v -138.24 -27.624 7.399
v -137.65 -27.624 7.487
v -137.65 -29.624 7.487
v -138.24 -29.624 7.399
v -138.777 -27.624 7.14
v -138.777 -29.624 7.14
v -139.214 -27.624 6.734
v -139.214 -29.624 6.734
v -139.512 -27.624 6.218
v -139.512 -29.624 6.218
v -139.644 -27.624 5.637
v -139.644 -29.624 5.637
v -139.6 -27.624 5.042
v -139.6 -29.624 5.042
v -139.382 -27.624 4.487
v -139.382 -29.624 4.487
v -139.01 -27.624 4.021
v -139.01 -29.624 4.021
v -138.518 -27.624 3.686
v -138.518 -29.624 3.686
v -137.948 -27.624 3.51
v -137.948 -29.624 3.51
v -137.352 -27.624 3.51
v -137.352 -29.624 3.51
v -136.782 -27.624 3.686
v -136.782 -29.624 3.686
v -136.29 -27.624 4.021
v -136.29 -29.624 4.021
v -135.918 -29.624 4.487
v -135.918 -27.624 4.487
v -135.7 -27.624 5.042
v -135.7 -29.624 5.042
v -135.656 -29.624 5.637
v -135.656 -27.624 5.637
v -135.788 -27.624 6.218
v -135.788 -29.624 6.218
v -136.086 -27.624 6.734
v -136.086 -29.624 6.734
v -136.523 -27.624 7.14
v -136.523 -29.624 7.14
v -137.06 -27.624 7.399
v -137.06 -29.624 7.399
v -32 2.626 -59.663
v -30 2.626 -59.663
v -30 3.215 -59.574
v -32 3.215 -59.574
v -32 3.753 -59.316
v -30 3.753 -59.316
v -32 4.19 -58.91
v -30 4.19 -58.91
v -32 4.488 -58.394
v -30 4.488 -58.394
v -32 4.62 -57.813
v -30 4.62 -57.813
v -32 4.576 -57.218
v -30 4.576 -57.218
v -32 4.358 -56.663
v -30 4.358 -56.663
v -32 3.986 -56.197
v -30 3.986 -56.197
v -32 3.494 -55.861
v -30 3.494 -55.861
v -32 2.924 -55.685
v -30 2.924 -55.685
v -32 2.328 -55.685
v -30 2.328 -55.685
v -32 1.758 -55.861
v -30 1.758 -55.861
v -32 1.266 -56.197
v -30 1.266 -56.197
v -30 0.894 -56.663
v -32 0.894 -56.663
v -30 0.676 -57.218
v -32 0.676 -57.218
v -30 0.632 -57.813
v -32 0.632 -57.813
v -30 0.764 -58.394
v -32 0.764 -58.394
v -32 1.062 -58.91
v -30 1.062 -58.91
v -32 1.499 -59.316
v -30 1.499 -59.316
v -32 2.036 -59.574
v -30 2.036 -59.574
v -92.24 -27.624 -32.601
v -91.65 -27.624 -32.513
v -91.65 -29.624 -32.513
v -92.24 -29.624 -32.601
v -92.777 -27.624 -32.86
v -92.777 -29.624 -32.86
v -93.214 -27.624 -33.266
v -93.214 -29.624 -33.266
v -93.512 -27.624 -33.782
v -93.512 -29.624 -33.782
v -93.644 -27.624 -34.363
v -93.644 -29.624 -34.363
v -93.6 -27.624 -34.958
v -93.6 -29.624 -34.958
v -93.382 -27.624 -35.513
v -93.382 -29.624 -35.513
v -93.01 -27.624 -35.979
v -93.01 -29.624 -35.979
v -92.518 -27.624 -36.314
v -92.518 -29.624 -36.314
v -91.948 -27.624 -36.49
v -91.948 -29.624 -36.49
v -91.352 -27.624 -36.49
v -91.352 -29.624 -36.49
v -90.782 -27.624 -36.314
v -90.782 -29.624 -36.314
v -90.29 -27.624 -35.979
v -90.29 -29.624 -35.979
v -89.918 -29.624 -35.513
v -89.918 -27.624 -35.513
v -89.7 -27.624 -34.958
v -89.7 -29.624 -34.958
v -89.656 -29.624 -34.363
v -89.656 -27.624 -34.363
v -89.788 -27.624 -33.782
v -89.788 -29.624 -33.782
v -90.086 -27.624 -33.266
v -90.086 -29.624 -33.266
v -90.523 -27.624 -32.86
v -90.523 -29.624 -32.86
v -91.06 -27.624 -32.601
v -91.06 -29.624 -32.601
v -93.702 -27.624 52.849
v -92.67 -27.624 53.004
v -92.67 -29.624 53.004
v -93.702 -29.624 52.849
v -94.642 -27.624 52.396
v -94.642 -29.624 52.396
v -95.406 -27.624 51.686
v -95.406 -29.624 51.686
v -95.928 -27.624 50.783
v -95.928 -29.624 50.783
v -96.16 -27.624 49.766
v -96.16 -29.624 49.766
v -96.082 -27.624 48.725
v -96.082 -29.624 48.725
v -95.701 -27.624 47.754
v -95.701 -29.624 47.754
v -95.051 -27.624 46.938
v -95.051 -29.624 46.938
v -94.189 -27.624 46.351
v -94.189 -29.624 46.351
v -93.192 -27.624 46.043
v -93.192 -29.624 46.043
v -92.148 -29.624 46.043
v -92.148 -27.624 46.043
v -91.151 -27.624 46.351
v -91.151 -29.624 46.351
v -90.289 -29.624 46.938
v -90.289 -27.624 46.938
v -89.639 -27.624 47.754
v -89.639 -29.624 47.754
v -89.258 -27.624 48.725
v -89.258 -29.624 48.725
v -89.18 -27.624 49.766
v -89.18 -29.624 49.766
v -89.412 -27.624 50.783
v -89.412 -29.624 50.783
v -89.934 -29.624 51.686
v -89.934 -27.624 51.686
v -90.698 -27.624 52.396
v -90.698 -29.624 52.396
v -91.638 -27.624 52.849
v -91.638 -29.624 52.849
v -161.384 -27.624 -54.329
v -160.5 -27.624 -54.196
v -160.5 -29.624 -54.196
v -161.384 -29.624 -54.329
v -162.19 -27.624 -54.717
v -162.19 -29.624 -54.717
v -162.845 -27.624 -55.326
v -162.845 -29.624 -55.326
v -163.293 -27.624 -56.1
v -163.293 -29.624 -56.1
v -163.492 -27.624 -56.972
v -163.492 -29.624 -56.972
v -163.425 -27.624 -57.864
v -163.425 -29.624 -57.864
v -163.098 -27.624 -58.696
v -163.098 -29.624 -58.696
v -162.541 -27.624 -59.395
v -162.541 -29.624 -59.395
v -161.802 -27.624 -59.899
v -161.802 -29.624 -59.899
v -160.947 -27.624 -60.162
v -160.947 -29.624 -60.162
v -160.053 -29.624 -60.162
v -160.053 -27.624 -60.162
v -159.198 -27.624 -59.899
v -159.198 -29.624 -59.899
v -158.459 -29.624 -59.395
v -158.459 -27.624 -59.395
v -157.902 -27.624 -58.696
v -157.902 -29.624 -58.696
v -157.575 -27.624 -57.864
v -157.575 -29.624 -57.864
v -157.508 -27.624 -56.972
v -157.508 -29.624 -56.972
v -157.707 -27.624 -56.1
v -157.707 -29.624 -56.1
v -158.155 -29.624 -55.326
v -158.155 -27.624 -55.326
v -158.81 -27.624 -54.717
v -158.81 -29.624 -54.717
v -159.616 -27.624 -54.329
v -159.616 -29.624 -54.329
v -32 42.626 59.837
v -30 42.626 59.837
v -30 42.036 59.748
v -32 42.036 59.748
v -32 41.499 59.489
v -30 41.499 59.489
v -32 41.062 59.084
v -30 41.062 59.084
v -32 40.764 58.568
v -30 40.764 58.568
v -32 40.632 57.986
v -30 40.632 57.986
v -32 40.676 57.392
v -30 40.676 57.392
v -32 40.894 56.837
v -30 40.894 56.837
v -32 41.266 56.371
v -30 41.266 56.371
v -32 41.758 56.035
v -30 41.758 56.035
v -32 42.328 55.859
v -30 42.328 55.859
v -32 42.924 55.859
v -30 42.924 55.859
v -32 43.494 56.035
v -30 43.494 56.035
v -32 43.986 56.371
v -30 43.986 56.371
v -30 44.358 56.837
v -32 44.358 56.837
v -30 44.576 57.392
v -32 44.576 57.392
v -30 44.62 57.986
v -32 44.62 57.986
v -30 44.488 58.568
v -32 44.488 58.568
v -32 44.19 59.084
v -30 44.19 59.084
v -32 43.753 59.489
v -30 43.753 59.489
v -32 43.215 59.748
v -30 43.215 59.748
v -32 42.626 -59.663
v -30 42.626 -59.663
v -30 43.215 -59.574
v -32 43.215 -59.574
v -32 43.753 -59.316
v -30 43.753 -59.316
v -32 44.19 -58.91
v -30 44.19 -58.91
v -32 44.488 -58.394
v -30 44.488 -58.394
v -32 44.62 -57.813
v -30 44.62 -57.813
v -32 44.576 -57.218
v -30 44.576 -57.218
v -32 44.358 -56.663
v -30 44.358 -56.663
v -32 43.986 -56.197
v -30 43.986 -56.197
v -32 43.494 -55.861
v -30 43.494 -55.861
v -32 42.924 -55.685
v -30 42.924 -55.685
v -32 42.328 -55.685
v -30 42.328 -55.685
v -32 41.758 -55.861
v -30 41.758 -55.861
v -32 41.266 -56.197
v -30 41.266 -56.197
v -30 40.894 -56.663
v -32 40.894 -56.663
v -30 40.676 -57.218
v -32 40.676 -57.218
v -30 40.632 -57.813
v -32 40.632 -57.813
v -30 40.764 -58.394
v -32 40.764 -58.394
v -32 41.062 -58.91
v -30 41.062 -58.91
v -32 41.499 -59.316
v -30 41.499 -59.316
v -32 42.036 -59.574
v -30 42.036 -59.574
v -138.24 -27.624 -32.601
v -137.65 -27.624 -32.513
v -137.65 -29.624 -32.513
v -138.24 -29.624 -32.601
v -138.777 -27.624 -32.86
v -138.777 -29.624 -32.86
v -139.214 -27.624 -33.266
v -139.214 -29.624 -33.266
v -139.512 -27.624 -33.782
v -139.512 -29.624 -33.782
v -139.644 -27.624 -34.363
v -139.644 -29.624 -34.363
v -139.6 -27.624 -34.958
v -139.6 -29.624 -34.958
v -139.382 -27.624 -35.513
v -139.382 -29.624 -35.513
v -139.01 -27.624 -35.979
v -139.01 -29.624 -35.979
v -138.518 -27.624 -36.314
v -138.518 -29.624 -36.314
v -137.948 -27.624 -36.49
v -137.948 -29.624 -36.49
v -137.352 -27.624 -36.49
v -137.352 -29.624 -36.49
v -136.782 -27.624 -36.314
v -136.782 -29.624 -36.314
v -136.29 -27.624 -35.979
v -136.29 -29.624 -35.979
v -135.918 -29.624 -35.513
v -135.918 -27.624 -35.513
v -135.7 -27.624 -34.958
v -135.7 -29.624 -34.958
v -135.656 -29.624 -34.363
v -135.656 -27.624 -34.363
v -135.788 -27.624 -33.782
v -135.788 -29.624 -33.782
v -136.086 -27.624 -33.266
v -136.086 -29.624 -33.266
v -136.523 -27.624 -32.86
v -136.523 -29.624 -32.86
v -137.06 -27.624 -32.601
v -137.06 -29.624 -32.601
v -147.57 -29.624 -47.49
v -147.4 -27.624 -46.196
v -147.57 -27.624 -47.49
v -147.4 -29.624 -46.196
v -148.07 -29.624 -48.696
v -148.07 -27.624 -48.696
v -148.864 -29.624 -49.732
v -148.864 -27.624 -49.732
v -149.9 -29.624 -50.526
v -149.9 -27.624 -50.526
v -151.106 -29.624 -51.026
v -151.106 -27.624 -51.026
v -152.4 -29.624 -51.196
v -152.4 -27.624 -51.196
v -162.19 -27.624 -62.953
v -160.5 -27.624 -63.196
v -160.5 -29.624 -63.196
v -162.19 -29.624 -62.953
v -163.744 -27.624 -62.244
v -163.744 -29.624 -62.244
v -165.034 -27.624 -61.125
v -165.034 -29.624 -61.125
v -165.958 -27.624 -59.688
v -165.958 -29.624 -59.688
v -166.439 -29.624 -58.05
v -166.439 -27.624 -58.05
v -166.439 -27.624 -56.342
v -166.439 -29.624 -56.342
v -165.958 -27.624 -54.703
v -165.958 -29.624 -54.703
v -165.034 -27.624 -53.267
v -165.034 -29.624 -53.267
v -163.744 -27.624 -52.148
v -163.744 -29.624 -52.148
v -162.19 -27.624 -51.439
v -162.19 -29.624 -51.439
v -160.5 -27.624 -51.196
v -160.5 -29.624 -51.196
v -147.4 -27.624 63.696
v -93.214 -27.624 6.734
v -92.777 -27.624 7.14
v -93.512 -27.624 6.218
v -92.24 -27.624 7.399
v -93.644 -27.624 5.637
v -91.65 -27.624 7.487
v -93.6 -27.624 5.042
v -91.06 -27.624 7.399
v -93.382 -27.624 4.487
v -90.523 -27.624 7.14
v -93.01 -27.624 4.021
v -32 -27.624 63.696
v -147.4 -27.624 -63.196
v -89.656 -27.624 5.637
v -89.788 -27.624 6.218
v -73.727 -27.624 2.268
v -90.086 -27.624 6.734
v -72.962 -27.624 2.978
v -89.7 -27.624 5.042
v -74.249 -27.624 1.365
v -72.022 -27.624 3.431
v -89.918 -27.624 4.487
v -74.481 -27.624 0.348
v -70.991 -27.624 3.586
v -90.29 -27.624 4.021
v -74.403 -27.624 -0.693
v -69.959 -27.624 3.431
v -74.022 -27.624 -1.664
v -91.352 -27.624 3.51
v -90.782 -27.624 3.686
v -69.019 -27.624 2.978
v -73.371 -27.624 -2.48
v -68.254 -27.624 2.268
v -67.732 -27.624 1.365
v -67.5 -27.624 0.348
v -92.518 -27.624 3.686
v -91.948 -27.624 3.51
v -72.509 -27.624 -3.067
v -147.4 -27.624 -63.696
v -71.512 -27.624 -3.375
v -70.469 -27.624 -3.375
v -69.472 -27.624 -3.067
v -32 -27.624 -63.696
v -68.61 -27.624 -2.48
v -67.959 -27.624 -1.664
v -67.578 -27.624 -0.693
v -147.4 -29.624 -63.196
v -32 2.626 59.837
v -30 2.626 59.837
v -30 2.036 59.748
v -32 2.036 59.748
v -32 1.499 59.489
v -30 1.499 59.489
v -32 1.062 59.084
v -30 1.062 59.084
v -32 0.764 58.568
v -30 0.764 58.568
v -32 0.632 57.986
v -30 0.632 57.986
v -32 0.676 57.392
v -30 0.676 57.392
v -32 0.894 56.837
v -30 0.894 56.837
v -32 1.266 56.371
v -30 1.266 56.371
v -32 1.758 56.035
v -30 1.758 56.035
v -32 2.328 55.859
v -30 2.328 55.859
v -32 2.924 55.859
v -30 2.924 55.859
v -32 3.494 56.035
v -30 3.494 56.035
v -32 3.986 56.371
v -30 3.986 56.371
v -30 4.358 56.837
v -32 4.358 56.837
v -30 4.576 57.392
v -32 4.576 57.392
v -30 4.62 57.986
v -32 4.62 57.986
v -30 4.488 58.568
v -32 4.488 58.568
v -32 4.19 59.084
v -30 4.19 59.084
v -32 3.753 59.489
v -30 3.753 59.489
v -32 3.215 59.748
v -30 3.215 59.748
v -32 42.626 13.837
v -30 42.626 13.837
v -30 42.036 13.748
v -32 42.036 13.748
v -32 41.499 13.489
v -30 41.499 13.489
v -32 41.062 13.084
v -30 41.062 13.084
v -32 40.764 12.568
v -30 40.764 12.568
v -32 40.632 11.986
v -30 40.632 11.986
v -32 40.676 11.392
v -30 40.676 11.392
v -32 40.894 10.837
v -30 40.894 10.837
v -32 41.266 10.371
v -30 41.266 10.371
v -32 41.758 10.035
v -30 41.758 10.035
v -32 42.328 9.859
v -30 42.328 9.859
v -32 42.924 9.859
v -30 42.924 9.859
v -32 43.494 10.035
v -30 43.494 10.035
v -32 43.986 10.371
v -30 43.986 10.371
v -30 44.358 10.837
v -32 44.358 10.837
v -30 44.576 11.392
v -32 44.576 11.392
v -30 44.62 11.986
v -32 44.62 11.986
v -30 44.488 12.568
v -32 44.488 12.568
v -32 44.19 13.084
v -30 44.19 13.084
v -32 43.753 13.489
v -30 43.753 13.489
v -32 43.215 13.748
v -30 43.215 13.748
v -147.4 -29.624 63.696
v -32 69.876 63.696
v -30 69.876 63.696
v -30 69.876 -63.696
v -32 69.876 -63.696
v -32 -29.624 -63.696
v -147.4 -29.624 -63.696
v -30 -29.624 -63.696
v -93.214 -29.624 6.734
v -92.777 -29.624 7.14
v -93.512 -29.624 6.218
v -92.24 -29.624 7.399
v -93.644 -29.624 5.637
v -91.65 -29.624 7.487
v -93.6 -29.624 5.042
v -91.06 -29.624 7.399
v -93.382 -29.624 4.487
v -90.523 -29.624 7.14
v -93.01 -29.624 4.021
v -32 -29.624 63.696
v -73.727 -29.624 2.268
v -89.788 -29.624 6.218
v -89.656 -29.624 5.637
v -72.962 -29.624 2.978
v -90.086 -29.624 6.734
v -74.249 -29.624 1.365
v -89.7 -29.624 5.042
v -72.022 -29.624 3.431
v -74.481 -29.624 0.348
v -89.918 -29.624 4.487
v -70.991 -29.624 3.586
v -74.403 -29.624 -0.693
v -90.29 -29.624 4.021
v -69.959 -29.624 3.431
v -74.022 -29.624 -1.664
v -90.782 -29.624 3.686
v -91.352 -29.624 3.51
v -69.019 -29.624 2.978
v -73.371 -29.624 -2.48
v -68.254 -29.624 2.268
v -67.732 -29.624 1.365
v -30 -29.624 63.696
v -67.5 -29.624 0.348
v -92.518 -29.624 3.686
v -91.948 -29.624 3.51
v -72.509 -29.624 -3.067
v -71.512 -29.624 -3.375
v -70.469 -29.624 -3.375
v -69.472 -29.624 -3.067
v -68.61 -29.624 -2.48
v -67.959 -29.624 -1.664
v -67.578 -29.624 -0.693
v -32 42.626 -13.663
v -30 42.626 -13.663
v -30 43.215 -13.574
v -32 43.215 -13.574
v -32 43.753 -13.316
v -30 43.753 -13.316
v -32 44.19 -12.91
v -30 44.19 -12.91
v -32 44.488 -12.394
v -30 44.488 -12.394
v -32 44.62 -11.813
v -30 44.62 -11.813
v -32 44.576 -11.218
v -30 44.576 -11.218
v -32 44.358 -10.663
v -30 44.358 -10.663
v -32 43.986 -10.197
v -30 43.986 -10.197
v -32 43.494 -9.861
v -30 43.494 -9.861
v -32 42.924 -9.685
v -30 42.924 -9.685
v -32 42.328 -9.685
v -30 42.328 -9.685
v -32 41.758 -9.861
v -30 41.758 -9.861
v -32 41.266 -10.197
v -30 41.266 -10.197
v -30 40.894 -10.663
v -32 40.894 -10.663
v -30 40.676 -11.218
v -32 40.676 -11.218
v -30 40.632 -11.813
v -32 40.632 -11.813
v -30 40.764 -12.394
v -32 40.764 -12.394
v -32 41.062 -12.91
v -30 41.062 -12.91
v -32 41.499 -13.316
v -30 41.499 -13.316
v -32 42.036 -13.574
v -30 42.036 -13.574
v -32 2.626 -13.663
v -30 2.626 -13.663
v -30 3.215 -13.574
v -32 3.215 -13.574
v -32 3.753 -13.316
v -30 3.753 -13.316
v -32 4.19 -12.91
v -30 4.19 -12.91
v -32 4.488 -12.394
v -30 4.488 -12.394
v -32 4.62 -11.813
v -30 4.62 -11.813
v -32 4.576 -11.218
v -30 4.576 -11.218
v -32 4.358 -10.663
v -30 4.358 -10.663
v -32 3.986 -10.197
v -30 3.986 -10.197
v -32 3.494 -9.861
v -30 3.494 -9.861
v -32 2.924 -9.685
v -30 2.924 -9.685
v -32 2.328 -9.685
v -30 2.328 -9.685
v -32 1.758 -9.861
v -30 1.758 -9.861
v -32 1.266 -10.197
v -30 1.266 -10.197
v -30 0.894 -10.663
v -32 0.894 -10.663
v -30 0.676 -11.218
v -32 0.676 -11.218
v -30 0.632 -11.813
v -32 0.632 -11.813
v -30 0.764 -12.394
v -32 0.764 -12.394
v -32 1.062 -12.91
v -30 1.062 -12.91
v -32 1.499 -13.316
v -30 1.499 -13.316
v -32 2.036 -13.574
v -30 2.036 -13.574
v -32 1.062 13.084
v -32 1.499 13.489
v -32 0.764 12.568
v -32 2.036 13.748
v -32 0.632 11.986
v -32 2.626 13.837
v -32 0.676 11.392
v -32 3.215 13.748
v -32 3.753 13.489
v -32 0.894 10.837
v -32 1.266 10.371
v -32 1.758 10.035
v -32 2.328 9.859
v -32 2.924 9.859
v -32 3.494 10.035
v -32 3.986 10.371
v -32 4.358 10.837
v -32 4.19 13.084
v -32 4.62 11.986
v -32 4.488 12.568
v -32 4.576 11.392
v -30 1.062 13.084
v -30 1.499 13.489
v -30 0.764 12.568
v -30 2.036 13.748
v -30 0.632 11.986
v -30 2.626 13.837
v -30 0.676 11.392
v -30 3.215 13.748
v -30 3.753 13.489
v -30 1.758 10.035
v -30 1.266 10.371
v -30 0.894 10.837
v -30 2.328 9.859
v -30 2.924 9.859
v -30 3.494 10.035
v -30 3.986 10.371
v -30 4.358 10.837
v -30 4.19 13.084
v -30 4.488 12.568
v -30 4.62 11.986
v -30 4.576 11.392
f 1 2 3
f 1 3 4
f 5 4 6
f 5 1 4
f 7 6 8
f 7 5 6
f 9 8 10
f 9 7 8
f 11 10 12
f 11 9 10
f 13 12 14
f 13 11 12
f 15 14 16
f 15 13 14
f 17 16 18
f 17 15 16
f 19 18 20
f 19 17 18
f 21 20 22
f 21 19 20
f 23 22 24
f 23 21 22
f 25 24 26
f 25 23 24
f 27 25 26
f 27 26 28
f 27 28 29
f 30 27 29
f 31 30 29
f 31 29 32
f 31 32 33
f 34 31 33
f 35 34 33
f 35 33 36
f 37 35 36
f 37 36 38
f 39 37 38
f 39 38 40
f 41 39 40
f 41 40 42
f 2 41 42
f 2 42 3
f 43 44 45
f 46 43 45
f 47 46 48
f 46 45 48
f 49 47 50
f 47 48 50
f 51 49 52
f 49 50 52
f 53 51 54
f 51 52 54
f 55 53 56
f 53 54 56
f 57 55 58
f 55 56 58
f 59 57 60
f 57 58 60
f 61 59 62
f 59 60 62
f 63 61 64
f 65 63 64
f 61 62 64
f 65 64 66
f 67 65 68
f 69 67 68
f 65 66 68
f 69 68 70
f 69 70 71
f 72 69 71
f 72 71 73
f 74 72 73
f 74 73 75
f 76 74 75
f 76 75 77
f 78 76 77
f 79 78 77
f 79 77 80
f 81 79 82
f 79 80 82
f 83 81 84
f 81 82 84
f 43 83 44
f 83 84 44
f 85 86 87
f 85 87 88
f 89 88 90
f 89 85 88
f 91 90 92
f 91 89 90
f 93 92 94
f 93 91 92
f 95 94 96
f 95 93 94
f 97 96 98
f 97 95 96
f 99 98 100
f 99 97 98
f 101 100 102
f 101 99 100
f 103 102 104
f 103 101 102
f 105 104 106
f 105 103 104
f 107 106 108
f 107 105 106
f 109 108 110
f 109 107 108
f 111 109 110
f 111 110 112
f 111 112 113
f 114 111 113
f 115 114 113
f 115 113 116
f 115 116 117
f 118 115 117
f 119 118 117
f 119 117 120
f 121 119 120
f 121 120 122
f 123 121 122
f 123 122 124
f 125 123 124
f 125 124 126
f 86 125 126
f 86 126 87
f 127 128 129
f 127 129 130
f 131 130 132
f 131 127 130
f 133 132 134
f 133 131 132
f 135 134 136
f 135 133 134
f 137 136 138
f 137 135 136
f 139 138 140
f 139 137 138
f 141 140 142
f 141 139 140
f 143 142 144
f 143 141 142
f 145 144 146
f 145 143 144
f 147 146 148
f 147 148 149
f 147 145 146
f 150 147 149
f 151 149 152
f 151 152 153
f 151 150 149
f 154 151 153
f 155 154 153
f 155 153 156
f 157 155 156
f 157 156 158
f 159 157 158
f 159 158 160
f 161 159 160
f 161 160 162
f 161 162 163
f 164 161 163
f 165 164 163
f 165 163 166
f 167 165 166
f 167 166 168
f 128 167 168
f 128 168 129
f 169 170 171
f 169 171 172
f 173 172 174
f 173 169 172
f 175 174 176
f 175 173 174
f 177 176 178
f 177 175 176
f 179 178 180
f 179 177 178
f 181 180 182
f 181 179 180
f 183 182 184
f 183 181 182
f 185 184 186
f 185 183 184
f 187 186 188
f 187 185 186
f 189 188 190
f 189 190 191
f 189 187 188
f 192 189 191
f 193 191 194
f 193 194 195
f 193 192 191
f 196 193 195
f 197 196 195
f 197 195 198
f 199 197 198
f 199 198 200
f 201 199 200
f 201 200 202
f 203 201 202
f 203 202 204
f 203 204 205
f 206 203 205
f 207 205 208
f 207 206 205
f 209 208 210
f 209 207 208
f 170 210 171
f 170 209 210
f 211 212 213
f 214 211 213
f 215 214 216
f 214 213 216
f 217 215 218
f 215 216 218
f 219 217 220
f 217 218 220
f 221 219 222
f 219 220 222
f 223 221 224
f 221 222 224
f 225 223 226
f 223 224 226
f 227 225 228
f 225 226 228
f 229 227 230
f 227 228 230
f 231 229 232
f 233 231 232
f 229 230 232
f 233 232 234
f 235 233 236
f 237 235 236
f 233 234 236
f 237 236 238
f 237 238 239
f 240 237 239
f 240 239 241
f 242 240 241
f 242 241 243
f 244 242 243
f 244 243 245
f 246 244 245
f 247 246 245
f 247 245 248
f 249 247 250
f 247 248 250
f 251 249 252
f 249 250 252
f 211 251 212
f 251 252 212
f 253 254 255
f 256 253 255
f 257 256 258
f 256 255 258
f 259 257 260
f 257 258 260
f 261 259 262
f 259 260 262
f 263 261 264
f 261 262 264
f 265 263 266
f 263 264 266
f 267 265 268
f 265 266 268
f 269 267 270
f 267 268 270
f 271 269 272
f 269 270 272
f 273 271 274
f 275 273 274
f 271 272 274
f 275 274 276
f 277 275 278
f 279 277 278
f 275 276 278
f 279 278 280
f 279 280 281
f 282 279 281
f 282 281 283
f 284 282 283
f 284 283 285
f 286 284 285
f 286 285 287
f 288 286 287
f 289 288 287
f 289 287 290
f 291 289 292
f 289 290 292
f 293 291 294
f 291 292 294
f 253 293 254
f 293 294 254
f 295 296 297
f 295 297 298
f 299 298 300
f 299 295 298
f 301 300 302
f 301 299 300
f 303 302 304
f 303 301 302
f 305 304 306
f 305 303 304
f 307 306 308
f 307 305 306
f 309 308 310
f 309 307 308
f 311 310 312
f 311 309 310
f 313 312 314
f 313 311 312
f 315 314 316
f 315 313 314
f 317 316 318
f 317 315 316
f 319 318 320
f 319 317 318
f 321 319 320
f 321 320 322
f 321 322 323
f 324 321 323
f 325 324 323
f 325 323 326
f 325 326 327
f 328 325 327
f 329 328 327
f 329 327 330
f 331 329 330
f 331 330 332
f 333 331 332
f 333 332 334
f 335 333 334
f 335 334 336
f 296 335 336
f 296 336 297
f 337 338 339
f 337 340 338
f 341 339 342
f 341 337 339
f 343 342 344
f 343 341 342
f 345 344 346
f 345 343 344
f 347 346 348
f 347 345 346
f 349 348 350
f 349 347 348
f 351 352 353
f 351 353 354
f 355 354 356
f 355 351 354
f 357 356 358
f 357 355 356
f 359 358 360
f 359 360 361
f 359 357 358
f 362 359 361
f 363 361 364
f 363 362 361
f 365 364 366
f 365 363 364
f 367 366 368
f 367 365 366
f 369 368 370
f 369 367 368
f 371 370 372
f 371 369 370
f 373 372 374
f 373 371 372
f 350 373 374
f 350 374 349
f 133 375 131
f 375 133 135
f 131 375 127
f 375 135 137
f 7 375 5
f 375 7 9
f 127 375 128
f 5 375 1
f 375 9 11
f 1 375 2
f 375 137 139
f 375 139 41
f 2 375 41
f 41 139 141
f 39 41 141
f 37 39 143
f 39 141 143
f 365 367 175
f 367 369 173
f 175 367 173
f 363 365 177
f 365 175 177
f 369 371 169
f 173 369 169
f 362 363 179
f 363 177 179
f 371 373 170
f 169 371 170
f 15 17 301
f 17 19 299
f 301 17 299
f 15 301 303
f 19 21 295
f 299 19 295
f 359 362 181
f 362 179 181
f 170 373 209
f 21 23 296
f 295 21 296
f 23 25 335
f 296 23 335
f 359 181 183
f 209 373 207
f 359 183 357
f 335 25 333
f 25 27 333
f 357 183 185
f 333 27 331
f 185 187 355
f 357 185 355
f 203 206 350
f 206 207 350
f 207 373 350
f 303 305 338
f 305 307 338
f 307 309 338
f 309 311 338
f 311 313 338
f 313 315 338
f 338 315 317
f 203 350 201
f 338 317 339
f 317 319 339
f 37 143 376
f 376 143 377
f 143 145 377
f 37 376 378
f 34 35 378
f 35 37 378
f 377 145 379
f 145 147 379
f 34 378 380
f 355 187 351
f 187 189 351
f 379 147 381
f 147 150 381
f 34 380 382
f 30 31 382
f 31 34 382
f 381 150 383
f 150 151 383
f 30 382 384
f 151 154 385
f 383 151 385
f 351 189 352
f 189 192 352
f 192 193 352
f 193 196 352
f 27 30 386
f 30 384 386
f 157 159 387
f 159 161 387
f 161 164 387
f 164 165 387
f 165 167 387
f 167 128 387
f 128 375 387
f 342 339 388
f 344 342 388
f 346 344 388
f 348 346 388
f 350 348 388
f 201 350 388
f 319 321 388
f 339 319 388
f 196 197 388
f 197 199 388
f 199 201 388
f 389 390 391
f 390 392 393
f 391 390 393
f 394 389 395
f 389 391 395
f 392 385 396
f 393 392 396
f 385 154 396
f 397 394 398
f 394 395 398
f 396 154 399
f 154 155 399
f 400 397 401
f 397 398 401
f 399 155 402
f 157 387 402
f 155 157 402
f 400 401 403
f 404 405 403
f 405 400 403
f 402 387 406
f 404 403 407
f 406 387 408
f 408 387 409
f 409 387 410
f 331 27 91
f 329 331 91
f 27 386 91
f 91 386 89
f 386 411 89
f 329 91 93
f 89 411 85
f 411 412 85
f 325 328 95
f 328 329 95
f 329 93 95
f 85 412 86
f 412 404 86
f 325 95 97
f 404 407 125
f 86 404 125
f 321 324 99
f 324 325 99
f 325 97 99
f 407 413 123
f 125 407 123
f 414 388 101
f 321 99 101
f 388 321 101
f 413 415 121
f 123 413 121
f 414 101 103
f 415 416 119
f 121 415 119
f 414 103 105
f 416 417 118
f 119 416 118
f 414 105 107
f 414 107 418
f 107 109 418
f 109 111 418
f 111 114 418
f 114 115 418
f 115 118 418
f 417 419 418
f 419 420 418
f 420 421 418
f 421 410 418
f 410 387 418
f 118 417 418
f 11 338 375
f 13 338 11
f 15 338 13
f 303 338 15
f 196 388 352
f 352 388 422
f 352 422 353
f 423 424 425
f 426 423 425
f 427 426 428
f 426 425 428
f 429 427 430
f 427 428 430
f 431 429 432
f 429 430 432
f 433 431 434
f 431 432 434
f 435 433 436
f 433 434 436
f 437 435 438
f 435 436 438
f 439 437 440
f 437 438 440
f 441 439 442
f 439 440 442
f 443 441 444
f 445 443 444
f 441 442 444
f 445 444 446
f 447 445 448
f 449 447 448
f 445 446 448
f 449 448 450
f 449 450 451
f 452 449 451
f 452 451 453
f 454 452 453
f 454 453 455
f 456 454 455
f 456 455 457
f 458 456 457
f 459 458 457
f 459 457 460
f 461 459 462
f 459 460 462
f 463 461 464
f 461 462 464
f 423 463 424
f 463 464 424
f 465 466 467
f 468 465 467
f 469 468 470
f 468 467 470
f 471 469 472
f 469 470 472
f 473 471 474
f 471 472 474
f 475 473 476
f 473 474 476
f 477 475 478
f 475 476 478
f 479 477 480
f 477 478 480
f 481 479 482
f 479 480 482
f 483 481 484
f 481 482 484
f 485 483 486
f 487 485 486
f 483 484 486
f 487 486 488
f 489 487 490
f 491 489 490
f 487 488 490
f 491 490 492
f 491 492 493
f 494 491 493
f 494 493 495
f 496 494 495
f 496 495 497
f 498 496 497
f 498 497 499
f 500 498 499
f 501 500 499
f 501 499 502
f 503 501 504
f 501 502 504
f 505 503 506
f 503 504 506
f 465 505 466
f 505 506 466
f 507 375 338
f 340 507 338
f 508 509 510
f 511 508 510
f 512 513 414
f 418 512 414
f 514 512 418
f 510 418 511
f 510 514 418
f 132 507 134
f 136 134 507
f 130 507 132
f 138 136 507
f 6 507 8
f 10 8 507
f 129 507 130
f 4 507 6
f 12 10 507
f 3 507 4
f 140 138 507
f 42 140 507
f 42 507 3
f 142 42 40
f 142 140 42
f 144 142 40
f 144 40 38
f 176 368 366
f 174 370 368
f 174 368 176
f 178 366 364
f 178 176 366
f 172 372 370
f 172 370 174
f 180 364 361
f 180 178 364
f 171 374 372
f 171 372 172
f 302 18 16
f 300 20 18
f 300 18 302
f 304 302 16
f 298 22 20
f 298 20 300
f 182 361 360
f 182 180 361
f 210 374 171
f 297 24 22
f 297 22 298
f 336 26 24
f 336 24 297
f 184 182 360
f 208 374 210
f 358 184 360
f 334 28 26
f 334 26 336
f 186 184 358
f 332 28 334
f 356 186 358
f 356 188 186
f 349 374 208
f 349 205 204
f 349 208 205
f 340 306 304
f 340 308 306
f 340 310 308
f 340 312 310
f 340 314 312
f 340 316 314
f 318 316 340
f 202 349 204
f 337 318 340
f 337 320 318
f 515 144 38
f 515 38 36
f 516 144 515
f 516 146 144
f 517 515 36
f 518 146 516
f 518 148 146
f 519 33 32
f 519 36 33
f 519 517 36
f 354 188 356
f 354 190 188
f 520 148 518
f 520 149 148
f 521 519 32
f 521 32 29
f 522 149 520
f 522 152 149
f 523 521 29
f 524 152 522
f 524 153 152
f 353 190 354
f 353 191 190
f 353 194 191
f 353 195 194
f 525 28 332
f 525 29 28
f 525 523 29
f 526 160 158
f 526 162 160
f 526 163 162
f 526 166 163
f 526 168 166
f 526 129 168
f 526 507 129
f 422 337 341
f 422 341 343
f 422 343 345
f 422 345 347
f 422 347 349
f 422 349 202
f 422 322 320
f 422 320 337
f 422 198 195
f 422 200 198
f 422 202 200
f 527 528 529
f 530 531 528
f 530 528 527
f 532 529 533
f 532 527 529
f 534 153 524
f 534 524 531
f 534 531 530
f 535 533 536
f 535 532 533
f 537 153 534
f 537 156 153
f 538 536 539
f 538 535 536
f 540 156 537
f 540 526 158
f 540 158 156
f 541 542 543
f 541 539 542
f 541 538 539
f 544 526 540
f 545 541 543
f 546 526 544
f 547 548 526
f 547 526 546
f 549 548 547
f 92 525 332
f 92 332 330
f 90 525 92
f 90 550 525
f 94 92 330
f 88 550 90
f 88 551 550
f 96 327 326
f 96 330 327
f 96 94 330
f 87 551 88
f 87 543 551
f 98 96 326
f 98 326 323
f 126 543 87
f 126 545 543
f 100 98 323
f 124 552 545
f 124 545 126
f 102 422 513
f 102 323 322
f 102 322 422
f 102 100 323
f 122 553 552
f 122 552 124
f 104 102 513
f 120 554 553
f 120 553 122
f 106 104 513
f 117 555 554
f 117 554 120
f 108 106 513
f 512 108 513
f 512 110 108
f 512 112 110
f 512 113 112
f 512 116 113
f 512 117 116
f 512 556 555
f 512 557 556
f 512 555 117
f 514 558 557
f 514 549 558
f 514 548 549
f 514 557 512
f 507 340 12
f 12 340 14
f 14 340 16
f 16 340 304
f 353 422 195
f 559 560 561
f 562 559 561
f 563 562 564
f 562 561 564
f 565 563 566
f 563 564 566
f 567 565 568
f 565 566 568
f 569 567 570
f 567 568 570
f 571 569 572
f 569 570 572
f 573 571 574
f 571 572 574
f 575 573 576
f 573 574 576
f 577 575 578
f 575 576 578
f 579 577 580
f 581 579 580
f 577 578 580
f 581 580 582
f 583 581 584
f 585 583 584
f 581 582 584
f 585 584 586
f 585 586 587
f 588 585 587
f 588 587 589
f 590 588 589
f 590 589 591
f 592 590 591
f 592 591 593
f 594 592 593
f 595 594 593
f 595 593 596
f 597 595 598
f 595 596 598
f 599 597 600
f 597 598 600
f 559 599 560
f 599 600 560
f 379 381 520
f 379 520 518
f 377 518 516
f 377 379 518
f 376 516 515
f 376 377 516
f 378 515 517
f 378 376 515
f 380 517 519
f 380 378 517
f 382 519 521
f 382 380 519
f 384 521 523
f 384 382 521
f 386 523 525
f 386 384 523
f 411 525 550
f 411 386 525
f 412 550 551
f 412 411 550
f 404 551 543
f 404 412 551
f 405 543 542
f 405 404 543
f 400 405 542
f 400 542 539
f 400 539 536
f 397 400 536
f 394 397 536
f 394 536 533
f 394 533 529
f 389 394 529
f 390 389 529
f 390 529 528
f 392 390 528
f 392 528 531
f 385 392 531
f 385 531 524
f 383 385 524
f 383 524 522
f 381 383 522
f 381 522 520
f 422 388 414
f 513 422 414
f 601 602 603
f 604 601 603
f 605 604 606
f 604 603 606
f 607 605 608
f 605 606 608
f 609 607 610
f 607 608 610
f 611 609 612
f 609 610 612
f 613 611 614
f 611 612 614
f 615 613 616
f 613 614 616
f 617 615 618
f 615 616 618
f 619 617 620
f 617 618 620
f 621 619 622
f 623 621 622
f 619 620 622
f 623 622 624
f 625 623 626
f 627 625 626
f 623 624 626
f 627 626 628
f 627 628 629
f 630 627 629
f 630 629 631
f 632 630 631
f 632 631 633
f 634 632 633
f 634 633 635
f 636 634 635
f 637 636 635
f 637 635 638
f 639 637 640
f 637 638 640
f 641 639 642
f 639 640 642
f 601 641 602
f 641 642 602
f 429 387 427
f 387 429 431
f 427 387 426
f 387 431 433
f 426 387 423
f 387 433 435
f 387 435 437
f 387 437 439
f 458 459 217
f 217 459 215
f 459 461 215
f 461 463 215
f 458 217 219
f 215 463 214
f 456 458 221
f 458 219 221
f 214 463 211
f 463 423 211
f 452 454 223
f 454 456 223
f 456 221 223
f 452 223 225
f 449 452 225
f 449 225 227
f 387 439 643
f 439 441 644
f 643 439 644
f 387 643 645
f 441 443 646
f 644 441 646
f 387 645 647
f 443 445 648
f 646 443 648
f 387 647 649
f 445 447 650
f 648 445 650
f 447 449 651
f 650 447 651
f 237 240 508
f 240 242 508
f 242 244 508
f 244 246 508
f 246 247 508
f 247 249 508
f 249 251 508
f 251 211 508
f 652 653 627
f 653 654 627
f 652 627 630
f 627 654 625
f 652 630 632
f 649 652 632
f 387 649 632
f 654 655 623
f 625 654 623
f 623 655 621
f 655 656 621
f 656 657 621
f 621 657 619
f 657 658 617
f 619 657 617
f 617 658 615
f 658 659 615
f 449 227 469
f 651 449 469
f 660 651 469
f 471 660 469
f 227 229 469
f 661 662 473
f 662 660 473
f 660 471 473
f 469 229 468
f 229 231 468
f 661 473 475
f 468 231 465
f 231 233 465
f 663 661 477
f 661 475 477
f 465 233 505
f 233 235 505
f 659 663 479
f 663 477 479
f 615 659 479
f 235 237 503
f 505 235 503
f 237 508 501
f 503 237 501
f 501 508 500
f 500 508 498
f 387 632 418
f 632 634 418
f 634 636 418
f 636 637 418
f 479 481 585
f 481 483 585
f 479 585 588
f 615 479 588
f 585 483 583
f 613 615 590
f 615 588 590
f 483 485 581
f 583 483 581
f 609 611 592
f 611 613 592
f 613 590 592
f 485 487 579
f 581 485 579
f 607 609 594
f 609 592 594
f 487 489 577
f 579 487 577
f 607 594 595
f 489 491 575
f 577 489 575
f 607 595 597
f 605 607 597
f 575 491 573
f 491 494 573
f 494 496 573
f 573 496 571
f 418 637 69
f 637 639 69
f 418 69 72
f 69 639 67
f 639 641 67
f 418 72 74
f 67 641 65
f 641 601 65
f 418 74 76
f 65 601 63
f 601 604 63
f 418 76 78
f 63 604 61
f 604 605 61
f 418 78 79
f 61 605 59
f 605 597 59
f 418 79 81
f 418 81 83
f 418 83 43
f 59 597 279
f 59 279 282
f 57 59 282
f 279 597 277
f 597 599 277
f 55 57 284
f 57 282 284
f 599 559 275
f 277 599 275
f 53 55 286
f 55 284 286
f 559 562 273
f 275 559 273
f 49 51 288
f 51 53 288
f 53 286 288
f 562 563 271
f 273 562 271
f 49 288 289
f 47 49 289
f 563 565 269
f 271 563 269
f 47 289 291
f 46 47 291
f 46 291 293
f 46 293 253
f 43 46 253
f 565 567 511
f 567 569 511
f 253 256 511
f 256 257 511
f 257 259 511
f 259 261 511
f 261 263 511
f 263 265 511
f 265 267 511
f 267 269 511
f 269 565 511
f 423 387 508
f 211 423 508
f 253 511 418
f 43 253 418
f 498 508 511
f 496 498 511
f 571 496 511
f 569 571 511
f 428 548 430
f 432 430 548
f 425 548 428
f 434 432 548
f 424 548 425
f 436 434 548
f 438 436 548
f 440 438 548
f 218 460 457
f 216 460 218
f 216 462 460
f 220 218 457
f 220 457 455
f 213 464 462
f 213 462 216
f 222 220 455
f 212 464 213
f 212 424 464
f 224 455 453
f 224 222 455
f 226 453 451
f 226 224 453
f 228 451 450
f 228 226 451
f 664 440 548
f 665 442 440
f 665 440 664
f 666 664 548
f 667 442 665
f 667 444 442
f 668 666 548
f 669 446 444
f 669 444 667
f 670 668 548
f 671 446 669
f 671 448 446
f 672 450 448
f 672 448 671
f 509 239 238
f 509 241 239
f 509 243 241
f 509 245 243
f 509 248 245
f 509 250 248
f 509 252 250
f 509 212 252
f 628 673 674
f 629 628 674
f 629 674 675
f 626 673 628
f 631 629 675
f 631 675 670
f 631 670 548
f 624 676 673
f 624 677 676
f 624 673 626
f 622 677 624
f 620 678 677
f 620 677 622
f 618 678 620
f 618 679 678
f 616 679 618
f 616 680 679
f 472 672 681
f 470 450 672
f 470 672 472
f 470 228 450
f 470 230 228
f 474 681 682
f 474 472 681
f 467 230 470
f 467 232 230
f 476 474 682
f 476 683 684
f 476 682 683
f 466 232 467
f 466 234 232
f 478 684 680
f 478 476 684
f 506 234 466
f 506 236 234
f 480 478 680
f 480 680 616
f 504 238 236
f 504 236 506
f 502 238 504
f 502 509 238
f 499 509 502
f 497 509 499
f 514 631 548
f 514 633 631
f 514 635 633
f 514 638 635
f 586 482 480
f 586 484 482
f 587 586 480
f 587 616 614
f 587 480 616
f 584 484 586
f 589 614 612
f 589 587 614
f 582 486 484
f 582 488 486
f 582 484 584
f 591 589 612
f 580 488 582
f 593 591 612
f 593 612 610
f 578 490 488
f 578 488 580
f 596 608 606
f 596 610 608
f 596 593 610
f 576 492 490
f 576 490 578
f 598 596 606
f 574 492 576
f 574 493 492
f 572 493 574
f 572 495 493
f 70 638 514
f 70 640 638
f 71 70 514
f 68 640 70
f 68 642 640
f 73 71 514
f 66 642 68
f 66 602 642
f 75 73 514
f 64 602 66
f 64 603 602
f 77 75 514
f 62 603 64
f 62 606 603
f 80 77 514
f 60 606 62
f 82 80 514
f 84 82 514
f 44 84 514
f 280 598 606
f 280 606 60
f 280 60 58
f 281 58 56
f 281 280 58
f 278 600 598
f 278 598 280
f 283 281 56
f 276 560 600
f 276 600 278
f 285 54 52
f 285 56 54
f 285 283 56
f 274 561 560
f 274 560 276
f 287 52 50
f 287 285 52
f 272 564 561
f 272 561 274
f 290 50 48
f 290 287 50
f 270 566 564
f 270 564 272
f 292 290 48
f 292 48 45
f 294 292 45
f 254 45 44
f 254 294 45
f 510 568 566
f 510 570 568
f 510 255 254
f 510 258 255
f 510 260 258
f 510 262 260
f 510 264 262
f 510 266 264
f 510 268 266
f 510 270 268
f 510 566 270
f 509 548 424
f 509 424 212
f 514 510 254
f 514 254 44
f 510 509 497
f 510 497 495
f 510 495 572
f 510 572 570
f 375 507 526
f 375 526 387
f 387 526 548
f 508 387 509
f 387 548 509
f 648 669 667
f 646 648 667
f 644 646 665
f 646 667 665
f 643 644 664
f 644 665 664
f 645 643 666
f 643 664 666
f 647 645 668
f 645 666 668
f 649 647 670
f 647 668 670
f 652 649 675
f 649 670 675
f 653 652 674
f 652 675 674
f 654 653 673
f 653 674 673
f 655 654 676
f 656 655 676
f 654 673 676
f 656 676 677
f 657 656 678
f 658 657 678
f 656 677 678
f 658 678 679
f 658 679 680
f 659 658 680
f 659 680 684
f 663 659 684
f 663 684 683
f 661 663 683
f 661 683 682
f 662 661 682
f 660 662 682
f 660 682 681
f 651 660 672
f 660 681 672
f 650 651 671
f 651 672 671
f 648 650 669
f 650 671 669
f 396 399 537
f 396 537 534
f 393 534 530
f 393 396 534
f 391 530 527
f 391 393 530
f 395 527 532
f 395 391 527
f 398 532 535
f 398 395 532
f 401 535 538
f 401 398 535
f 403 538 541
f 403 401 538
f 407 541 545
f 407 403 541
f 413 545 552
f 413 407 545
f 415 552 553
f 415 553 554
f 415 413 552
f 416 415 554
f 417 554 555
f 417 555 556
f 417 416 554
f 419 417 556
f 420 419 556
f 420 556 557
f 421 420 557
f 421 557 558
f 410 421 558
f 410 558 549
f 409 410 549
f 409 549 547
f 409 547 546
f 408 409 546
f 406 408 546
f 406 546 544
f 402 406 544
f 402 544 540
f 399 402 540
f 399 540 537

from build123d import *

# Parameters (mm, degrees)
SKETCH_1_W          = 127.39196645
SKETCH_1_H          = 99.499845157
SKETCH_1_R          = 2
EXTRUDE_1_DEPTH     = 2
SKETCH_2_W          = 127.39196645
SKETCH_2_H          = 2
EXTRUDE_2_DEPTH     = 115.4
SKETCH_4_R          = 2
CUT_EXTRUDE_1_DEPTH = 144.079097981
SKETCH_6_R          = 3.5
CUT_EXTRUDE_2_DEPTH = 166.366738145
SKETCH_7_R          = 3
EXTRUDE_3_DEPTH     = 2
FILLET_1_R          = 5
SKETCH_8_W          = 161.877108061
SKETCH_8_H          = 133.071465469
CUT_EXTRUDE_3_DEPTH = 179.583476668


with BuildPart() as part:
    # Эскиз1 → Бобышка-Вытянуть1 (new body)
    with BuildSketch(Plane(origin=(0, 0, 0), x_dir=(0, 0, -1), z_dir=(1, 0, 0))):
        with Locations((0, 20.12589484)):
            Rectangle(SKETCH_1_W, SKETCH_1_H)
        with Locations((11.663084527, 42.625972261)):
            Circle(SKETCH_1_R, mode=Mode.SUBTRACT)
        with Locations((57.663084527, 42.625972261)):
            Circle(SKETCH_1_R, mode=Mode.SUBTRACT)
        with Locations((57.663084527, 2.625972261)):
            Circle(SKETCH_1_R, mode=Mode.SUBTRACT)
        with Locations((11.663084527, 2.625972261)):
            Circle(SKETCH_1_R, mode=Mode.SUBTRACT)
        with Locations(Location((-11.836915473, 2.625972261, 0), (0, 0, 180))):
            Circle(SKETCH_1_R, mode=Mode.SUBTRACT)
        with Locations(Location((-57.836915473, 2.625972261, 0), (0, 0, 180))):
            Circle(SKETCH_1_R, mode=Mode.SUBTRACT)
        with Locations(Location((-57.836915473, 42.625972261, 0), (0, 0, 180))):
            Circle(SKETCH_1_R, mode=Mode.SUBTRACT)
        with Locations(Location((-11.836915473, 42.625972261, 0), (0, 0, 180))):
            Circle(SKETCH_1_R, mode=Mode.SUBTRACT)
    extrude(amount=EXTRUDE_1_DEPTH)

    # Эскиз2 → Бобышка-Вытянуть2 (add)
    with BuildSketch(Plane(origin=(2, 0, 0), x_dir=(0, 0, -1), z_dir=(1, 0, 0))):
        with Locations((0, -28.624027739)):
            Rectangle(SKETCH_2_W, SKETCH_2_H)
    extrude(amount=EXTRUDE_2_DEPTH)

    # Эскиз4 → Вырез-Вытянуть1 (cut, through all)
    with BuildSketch(Plane(origin=(0, 21.675972261, 0), x_dir=(1, 0, 0), z_dir=(0, 1, 0))):
        with Locations(Location((61.65, 34.512555998, 0), (0, 0, 270))):
            Circle(SKETCH_4_R)
        with Locations(Location((61.65, -5.487444002, 0), (0, 0, 270))):
            Circle(SKETCH_4_R)
        with Locations(Location((107.65, -5.487444002, 0), (0, 0, 270))):
            Circle(SKETCH_4_R)
        with Locations(Location((107.65, 34.512555998, 0), (0, 0, 270))):
            Circle(SKETCH_4_R)
    extrude(amount=-CUT_EXTRUDE_1_DEPTH, mode=Mode.SUBTRACT)

    # Эскиз6 → Вырез-Вытянуть2 (cut, through all)
    with BuildSketch(Plane(origin=(0, -27.624027739, 0), x_dir=(1, 0, 0), z_dir=(0, 1, 0))):
        with Locations(Location((62.669967975, -49.504016775, 0), (0, 0, 270))):
            Circle(SKETCH_6_R)
        with Locations(Location((40.99052879, -0.086168012, 0), (0, 0, 270))):
            Circle(SKETCH_6_R)
    extrude(amount=-CUT_EXTRUDE_2_DEPTH, mode=Mode.SUBTRACT)

    # Эскиз7 → Бобышка-Вытянуть3 (add)
    with BuildSketch(Plane(origin=(0, -27.624027739, 0), x_dir=(1, 0, 0), z_dir=(0, 1, 0))):
        with BuildLine():
            Line((130.5, 51.195983225), (117.4, 51.195983225))
            Line((117.4, 51.195983225), (117.4, 63.195983225))
            Line((117.4, 63.195983225), (130.5, 63.195983225))
            ThreePointArc((130.5, 63.195983225), (136.5, 57.195983225), (130.5, 51.195983225))
        make_face()
        with Locations(Location((130.5, 57.195983225, 0), (0, 0, 270))):
            Circle(SKETCH_7_R, mode=Mode.SUBTRACT)
    extrude(amount=-EXTRUDE_3_DEPTH)

    # Скругление1
    fillet_1_edges = [part.edges().sort_by_distance(p)[0] for p in [
        (117.4, -28.624027739, -51.195983225),
    ]]
    fillet(fillet_1_edges, radius=FILLET_1_R)


with BuildPart() as body_2:
    # Зеркальное отражение1: mirrored copy
    add(part.part.mirror(Plane.ZY.offset(15)))


with BuildPart() as part_1:
    add(part.part)

    # Эскиз8 → Вырез-Вытянуть3 (cut, through all)
    with BuildSketch(Plane.ZY.offset(15)):
        with Locations((1.413773869, 20.567699173)):
            Rectangle(SKETCH_8_W, SKETCH_8_H)
    extrude(amount=-CUT_EXTRUDE_3_DEPTH, mode=Mode.SUBTRACT)


solid = body_2.part
